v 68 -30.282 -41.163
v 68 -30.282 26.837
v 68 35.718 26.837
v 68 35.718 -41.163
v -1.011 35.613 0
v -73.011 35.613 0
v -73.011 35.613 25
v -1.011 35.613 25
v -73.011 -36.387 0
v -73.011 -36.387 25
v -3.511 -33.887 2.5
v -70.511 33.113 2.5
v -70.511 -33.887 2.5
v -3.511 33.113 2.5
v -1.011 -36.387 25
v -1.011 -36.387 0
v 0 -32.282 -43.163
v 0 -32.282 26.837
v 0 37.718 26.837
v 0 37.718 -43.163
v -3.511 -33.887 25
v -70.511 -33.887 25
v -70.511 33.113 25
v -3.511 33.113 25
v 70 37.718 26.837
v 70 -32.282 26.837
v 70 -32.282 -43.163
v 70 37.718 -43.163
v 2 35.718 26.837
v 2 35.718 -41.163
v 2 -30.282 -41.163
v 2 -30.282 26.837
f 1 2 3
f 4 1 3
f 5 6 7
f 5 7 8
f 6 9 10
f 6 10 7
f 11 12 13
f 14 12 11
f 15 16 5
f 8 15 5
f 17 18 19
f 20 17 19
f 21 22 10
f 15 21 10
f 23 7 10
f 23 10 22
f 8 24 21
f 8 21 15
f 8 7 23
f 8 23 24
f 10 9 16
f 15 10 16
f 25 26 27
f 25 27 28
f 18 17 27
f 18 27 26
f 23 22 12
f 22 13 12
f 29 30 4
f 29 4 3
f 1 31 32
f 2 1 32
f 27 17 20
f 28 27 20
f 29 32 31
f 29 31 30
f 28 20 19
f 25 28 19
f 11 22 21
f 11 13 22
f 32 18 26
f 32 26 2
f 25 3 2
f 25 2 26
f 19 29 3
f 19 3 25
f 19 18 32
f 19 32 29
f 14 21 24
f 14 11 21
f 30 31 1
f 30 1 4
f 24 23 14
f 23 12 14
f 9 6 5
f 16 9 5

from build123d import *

# Parameters (mm, degrees)
F0_W     = 70
F0_H     = 70
F1_DEPTH = 70
F2_T     = -2
F3_W     = 72
F3_H     = 72
F4_DEPTH = 25
F5_T     = -2.5


with BuildPart() as f1:
    # F0 (on Right) → F1 (new body)
    with BuildSketch(Plane.YZ):
        with Locations((2.717556, -8.163129)):
            Rectangle(F0_W, F0_H)
    extrude(amount=F1_DEPTH)

    # F2
    f2_openings = [f1.faces().sort_by_distance(p)[0] for p in [
        (35, 2.717556, 26.836871),
    ]]
    offset(amount=F2_T, openings=f2_openings)


with BuildPart() as f4:
    # F3 (on Top) → F4 (new body)
    with BuildSketch(Plane.XY):
        with Locations((-37.011256, -0.387281)):
            Rectangle(F3_W, F3_H)
    extrude(amount=F4_DEPTH)

    # F5
    f5_openings = [f4.faces().sort_by_distance(p)[0] for p in [
        (-37.011256, -0.387281, 25),
    ]]
    offset(amount=F5_T, openings=f5_openings)


solid = Compound([f1.part, f4.part])
